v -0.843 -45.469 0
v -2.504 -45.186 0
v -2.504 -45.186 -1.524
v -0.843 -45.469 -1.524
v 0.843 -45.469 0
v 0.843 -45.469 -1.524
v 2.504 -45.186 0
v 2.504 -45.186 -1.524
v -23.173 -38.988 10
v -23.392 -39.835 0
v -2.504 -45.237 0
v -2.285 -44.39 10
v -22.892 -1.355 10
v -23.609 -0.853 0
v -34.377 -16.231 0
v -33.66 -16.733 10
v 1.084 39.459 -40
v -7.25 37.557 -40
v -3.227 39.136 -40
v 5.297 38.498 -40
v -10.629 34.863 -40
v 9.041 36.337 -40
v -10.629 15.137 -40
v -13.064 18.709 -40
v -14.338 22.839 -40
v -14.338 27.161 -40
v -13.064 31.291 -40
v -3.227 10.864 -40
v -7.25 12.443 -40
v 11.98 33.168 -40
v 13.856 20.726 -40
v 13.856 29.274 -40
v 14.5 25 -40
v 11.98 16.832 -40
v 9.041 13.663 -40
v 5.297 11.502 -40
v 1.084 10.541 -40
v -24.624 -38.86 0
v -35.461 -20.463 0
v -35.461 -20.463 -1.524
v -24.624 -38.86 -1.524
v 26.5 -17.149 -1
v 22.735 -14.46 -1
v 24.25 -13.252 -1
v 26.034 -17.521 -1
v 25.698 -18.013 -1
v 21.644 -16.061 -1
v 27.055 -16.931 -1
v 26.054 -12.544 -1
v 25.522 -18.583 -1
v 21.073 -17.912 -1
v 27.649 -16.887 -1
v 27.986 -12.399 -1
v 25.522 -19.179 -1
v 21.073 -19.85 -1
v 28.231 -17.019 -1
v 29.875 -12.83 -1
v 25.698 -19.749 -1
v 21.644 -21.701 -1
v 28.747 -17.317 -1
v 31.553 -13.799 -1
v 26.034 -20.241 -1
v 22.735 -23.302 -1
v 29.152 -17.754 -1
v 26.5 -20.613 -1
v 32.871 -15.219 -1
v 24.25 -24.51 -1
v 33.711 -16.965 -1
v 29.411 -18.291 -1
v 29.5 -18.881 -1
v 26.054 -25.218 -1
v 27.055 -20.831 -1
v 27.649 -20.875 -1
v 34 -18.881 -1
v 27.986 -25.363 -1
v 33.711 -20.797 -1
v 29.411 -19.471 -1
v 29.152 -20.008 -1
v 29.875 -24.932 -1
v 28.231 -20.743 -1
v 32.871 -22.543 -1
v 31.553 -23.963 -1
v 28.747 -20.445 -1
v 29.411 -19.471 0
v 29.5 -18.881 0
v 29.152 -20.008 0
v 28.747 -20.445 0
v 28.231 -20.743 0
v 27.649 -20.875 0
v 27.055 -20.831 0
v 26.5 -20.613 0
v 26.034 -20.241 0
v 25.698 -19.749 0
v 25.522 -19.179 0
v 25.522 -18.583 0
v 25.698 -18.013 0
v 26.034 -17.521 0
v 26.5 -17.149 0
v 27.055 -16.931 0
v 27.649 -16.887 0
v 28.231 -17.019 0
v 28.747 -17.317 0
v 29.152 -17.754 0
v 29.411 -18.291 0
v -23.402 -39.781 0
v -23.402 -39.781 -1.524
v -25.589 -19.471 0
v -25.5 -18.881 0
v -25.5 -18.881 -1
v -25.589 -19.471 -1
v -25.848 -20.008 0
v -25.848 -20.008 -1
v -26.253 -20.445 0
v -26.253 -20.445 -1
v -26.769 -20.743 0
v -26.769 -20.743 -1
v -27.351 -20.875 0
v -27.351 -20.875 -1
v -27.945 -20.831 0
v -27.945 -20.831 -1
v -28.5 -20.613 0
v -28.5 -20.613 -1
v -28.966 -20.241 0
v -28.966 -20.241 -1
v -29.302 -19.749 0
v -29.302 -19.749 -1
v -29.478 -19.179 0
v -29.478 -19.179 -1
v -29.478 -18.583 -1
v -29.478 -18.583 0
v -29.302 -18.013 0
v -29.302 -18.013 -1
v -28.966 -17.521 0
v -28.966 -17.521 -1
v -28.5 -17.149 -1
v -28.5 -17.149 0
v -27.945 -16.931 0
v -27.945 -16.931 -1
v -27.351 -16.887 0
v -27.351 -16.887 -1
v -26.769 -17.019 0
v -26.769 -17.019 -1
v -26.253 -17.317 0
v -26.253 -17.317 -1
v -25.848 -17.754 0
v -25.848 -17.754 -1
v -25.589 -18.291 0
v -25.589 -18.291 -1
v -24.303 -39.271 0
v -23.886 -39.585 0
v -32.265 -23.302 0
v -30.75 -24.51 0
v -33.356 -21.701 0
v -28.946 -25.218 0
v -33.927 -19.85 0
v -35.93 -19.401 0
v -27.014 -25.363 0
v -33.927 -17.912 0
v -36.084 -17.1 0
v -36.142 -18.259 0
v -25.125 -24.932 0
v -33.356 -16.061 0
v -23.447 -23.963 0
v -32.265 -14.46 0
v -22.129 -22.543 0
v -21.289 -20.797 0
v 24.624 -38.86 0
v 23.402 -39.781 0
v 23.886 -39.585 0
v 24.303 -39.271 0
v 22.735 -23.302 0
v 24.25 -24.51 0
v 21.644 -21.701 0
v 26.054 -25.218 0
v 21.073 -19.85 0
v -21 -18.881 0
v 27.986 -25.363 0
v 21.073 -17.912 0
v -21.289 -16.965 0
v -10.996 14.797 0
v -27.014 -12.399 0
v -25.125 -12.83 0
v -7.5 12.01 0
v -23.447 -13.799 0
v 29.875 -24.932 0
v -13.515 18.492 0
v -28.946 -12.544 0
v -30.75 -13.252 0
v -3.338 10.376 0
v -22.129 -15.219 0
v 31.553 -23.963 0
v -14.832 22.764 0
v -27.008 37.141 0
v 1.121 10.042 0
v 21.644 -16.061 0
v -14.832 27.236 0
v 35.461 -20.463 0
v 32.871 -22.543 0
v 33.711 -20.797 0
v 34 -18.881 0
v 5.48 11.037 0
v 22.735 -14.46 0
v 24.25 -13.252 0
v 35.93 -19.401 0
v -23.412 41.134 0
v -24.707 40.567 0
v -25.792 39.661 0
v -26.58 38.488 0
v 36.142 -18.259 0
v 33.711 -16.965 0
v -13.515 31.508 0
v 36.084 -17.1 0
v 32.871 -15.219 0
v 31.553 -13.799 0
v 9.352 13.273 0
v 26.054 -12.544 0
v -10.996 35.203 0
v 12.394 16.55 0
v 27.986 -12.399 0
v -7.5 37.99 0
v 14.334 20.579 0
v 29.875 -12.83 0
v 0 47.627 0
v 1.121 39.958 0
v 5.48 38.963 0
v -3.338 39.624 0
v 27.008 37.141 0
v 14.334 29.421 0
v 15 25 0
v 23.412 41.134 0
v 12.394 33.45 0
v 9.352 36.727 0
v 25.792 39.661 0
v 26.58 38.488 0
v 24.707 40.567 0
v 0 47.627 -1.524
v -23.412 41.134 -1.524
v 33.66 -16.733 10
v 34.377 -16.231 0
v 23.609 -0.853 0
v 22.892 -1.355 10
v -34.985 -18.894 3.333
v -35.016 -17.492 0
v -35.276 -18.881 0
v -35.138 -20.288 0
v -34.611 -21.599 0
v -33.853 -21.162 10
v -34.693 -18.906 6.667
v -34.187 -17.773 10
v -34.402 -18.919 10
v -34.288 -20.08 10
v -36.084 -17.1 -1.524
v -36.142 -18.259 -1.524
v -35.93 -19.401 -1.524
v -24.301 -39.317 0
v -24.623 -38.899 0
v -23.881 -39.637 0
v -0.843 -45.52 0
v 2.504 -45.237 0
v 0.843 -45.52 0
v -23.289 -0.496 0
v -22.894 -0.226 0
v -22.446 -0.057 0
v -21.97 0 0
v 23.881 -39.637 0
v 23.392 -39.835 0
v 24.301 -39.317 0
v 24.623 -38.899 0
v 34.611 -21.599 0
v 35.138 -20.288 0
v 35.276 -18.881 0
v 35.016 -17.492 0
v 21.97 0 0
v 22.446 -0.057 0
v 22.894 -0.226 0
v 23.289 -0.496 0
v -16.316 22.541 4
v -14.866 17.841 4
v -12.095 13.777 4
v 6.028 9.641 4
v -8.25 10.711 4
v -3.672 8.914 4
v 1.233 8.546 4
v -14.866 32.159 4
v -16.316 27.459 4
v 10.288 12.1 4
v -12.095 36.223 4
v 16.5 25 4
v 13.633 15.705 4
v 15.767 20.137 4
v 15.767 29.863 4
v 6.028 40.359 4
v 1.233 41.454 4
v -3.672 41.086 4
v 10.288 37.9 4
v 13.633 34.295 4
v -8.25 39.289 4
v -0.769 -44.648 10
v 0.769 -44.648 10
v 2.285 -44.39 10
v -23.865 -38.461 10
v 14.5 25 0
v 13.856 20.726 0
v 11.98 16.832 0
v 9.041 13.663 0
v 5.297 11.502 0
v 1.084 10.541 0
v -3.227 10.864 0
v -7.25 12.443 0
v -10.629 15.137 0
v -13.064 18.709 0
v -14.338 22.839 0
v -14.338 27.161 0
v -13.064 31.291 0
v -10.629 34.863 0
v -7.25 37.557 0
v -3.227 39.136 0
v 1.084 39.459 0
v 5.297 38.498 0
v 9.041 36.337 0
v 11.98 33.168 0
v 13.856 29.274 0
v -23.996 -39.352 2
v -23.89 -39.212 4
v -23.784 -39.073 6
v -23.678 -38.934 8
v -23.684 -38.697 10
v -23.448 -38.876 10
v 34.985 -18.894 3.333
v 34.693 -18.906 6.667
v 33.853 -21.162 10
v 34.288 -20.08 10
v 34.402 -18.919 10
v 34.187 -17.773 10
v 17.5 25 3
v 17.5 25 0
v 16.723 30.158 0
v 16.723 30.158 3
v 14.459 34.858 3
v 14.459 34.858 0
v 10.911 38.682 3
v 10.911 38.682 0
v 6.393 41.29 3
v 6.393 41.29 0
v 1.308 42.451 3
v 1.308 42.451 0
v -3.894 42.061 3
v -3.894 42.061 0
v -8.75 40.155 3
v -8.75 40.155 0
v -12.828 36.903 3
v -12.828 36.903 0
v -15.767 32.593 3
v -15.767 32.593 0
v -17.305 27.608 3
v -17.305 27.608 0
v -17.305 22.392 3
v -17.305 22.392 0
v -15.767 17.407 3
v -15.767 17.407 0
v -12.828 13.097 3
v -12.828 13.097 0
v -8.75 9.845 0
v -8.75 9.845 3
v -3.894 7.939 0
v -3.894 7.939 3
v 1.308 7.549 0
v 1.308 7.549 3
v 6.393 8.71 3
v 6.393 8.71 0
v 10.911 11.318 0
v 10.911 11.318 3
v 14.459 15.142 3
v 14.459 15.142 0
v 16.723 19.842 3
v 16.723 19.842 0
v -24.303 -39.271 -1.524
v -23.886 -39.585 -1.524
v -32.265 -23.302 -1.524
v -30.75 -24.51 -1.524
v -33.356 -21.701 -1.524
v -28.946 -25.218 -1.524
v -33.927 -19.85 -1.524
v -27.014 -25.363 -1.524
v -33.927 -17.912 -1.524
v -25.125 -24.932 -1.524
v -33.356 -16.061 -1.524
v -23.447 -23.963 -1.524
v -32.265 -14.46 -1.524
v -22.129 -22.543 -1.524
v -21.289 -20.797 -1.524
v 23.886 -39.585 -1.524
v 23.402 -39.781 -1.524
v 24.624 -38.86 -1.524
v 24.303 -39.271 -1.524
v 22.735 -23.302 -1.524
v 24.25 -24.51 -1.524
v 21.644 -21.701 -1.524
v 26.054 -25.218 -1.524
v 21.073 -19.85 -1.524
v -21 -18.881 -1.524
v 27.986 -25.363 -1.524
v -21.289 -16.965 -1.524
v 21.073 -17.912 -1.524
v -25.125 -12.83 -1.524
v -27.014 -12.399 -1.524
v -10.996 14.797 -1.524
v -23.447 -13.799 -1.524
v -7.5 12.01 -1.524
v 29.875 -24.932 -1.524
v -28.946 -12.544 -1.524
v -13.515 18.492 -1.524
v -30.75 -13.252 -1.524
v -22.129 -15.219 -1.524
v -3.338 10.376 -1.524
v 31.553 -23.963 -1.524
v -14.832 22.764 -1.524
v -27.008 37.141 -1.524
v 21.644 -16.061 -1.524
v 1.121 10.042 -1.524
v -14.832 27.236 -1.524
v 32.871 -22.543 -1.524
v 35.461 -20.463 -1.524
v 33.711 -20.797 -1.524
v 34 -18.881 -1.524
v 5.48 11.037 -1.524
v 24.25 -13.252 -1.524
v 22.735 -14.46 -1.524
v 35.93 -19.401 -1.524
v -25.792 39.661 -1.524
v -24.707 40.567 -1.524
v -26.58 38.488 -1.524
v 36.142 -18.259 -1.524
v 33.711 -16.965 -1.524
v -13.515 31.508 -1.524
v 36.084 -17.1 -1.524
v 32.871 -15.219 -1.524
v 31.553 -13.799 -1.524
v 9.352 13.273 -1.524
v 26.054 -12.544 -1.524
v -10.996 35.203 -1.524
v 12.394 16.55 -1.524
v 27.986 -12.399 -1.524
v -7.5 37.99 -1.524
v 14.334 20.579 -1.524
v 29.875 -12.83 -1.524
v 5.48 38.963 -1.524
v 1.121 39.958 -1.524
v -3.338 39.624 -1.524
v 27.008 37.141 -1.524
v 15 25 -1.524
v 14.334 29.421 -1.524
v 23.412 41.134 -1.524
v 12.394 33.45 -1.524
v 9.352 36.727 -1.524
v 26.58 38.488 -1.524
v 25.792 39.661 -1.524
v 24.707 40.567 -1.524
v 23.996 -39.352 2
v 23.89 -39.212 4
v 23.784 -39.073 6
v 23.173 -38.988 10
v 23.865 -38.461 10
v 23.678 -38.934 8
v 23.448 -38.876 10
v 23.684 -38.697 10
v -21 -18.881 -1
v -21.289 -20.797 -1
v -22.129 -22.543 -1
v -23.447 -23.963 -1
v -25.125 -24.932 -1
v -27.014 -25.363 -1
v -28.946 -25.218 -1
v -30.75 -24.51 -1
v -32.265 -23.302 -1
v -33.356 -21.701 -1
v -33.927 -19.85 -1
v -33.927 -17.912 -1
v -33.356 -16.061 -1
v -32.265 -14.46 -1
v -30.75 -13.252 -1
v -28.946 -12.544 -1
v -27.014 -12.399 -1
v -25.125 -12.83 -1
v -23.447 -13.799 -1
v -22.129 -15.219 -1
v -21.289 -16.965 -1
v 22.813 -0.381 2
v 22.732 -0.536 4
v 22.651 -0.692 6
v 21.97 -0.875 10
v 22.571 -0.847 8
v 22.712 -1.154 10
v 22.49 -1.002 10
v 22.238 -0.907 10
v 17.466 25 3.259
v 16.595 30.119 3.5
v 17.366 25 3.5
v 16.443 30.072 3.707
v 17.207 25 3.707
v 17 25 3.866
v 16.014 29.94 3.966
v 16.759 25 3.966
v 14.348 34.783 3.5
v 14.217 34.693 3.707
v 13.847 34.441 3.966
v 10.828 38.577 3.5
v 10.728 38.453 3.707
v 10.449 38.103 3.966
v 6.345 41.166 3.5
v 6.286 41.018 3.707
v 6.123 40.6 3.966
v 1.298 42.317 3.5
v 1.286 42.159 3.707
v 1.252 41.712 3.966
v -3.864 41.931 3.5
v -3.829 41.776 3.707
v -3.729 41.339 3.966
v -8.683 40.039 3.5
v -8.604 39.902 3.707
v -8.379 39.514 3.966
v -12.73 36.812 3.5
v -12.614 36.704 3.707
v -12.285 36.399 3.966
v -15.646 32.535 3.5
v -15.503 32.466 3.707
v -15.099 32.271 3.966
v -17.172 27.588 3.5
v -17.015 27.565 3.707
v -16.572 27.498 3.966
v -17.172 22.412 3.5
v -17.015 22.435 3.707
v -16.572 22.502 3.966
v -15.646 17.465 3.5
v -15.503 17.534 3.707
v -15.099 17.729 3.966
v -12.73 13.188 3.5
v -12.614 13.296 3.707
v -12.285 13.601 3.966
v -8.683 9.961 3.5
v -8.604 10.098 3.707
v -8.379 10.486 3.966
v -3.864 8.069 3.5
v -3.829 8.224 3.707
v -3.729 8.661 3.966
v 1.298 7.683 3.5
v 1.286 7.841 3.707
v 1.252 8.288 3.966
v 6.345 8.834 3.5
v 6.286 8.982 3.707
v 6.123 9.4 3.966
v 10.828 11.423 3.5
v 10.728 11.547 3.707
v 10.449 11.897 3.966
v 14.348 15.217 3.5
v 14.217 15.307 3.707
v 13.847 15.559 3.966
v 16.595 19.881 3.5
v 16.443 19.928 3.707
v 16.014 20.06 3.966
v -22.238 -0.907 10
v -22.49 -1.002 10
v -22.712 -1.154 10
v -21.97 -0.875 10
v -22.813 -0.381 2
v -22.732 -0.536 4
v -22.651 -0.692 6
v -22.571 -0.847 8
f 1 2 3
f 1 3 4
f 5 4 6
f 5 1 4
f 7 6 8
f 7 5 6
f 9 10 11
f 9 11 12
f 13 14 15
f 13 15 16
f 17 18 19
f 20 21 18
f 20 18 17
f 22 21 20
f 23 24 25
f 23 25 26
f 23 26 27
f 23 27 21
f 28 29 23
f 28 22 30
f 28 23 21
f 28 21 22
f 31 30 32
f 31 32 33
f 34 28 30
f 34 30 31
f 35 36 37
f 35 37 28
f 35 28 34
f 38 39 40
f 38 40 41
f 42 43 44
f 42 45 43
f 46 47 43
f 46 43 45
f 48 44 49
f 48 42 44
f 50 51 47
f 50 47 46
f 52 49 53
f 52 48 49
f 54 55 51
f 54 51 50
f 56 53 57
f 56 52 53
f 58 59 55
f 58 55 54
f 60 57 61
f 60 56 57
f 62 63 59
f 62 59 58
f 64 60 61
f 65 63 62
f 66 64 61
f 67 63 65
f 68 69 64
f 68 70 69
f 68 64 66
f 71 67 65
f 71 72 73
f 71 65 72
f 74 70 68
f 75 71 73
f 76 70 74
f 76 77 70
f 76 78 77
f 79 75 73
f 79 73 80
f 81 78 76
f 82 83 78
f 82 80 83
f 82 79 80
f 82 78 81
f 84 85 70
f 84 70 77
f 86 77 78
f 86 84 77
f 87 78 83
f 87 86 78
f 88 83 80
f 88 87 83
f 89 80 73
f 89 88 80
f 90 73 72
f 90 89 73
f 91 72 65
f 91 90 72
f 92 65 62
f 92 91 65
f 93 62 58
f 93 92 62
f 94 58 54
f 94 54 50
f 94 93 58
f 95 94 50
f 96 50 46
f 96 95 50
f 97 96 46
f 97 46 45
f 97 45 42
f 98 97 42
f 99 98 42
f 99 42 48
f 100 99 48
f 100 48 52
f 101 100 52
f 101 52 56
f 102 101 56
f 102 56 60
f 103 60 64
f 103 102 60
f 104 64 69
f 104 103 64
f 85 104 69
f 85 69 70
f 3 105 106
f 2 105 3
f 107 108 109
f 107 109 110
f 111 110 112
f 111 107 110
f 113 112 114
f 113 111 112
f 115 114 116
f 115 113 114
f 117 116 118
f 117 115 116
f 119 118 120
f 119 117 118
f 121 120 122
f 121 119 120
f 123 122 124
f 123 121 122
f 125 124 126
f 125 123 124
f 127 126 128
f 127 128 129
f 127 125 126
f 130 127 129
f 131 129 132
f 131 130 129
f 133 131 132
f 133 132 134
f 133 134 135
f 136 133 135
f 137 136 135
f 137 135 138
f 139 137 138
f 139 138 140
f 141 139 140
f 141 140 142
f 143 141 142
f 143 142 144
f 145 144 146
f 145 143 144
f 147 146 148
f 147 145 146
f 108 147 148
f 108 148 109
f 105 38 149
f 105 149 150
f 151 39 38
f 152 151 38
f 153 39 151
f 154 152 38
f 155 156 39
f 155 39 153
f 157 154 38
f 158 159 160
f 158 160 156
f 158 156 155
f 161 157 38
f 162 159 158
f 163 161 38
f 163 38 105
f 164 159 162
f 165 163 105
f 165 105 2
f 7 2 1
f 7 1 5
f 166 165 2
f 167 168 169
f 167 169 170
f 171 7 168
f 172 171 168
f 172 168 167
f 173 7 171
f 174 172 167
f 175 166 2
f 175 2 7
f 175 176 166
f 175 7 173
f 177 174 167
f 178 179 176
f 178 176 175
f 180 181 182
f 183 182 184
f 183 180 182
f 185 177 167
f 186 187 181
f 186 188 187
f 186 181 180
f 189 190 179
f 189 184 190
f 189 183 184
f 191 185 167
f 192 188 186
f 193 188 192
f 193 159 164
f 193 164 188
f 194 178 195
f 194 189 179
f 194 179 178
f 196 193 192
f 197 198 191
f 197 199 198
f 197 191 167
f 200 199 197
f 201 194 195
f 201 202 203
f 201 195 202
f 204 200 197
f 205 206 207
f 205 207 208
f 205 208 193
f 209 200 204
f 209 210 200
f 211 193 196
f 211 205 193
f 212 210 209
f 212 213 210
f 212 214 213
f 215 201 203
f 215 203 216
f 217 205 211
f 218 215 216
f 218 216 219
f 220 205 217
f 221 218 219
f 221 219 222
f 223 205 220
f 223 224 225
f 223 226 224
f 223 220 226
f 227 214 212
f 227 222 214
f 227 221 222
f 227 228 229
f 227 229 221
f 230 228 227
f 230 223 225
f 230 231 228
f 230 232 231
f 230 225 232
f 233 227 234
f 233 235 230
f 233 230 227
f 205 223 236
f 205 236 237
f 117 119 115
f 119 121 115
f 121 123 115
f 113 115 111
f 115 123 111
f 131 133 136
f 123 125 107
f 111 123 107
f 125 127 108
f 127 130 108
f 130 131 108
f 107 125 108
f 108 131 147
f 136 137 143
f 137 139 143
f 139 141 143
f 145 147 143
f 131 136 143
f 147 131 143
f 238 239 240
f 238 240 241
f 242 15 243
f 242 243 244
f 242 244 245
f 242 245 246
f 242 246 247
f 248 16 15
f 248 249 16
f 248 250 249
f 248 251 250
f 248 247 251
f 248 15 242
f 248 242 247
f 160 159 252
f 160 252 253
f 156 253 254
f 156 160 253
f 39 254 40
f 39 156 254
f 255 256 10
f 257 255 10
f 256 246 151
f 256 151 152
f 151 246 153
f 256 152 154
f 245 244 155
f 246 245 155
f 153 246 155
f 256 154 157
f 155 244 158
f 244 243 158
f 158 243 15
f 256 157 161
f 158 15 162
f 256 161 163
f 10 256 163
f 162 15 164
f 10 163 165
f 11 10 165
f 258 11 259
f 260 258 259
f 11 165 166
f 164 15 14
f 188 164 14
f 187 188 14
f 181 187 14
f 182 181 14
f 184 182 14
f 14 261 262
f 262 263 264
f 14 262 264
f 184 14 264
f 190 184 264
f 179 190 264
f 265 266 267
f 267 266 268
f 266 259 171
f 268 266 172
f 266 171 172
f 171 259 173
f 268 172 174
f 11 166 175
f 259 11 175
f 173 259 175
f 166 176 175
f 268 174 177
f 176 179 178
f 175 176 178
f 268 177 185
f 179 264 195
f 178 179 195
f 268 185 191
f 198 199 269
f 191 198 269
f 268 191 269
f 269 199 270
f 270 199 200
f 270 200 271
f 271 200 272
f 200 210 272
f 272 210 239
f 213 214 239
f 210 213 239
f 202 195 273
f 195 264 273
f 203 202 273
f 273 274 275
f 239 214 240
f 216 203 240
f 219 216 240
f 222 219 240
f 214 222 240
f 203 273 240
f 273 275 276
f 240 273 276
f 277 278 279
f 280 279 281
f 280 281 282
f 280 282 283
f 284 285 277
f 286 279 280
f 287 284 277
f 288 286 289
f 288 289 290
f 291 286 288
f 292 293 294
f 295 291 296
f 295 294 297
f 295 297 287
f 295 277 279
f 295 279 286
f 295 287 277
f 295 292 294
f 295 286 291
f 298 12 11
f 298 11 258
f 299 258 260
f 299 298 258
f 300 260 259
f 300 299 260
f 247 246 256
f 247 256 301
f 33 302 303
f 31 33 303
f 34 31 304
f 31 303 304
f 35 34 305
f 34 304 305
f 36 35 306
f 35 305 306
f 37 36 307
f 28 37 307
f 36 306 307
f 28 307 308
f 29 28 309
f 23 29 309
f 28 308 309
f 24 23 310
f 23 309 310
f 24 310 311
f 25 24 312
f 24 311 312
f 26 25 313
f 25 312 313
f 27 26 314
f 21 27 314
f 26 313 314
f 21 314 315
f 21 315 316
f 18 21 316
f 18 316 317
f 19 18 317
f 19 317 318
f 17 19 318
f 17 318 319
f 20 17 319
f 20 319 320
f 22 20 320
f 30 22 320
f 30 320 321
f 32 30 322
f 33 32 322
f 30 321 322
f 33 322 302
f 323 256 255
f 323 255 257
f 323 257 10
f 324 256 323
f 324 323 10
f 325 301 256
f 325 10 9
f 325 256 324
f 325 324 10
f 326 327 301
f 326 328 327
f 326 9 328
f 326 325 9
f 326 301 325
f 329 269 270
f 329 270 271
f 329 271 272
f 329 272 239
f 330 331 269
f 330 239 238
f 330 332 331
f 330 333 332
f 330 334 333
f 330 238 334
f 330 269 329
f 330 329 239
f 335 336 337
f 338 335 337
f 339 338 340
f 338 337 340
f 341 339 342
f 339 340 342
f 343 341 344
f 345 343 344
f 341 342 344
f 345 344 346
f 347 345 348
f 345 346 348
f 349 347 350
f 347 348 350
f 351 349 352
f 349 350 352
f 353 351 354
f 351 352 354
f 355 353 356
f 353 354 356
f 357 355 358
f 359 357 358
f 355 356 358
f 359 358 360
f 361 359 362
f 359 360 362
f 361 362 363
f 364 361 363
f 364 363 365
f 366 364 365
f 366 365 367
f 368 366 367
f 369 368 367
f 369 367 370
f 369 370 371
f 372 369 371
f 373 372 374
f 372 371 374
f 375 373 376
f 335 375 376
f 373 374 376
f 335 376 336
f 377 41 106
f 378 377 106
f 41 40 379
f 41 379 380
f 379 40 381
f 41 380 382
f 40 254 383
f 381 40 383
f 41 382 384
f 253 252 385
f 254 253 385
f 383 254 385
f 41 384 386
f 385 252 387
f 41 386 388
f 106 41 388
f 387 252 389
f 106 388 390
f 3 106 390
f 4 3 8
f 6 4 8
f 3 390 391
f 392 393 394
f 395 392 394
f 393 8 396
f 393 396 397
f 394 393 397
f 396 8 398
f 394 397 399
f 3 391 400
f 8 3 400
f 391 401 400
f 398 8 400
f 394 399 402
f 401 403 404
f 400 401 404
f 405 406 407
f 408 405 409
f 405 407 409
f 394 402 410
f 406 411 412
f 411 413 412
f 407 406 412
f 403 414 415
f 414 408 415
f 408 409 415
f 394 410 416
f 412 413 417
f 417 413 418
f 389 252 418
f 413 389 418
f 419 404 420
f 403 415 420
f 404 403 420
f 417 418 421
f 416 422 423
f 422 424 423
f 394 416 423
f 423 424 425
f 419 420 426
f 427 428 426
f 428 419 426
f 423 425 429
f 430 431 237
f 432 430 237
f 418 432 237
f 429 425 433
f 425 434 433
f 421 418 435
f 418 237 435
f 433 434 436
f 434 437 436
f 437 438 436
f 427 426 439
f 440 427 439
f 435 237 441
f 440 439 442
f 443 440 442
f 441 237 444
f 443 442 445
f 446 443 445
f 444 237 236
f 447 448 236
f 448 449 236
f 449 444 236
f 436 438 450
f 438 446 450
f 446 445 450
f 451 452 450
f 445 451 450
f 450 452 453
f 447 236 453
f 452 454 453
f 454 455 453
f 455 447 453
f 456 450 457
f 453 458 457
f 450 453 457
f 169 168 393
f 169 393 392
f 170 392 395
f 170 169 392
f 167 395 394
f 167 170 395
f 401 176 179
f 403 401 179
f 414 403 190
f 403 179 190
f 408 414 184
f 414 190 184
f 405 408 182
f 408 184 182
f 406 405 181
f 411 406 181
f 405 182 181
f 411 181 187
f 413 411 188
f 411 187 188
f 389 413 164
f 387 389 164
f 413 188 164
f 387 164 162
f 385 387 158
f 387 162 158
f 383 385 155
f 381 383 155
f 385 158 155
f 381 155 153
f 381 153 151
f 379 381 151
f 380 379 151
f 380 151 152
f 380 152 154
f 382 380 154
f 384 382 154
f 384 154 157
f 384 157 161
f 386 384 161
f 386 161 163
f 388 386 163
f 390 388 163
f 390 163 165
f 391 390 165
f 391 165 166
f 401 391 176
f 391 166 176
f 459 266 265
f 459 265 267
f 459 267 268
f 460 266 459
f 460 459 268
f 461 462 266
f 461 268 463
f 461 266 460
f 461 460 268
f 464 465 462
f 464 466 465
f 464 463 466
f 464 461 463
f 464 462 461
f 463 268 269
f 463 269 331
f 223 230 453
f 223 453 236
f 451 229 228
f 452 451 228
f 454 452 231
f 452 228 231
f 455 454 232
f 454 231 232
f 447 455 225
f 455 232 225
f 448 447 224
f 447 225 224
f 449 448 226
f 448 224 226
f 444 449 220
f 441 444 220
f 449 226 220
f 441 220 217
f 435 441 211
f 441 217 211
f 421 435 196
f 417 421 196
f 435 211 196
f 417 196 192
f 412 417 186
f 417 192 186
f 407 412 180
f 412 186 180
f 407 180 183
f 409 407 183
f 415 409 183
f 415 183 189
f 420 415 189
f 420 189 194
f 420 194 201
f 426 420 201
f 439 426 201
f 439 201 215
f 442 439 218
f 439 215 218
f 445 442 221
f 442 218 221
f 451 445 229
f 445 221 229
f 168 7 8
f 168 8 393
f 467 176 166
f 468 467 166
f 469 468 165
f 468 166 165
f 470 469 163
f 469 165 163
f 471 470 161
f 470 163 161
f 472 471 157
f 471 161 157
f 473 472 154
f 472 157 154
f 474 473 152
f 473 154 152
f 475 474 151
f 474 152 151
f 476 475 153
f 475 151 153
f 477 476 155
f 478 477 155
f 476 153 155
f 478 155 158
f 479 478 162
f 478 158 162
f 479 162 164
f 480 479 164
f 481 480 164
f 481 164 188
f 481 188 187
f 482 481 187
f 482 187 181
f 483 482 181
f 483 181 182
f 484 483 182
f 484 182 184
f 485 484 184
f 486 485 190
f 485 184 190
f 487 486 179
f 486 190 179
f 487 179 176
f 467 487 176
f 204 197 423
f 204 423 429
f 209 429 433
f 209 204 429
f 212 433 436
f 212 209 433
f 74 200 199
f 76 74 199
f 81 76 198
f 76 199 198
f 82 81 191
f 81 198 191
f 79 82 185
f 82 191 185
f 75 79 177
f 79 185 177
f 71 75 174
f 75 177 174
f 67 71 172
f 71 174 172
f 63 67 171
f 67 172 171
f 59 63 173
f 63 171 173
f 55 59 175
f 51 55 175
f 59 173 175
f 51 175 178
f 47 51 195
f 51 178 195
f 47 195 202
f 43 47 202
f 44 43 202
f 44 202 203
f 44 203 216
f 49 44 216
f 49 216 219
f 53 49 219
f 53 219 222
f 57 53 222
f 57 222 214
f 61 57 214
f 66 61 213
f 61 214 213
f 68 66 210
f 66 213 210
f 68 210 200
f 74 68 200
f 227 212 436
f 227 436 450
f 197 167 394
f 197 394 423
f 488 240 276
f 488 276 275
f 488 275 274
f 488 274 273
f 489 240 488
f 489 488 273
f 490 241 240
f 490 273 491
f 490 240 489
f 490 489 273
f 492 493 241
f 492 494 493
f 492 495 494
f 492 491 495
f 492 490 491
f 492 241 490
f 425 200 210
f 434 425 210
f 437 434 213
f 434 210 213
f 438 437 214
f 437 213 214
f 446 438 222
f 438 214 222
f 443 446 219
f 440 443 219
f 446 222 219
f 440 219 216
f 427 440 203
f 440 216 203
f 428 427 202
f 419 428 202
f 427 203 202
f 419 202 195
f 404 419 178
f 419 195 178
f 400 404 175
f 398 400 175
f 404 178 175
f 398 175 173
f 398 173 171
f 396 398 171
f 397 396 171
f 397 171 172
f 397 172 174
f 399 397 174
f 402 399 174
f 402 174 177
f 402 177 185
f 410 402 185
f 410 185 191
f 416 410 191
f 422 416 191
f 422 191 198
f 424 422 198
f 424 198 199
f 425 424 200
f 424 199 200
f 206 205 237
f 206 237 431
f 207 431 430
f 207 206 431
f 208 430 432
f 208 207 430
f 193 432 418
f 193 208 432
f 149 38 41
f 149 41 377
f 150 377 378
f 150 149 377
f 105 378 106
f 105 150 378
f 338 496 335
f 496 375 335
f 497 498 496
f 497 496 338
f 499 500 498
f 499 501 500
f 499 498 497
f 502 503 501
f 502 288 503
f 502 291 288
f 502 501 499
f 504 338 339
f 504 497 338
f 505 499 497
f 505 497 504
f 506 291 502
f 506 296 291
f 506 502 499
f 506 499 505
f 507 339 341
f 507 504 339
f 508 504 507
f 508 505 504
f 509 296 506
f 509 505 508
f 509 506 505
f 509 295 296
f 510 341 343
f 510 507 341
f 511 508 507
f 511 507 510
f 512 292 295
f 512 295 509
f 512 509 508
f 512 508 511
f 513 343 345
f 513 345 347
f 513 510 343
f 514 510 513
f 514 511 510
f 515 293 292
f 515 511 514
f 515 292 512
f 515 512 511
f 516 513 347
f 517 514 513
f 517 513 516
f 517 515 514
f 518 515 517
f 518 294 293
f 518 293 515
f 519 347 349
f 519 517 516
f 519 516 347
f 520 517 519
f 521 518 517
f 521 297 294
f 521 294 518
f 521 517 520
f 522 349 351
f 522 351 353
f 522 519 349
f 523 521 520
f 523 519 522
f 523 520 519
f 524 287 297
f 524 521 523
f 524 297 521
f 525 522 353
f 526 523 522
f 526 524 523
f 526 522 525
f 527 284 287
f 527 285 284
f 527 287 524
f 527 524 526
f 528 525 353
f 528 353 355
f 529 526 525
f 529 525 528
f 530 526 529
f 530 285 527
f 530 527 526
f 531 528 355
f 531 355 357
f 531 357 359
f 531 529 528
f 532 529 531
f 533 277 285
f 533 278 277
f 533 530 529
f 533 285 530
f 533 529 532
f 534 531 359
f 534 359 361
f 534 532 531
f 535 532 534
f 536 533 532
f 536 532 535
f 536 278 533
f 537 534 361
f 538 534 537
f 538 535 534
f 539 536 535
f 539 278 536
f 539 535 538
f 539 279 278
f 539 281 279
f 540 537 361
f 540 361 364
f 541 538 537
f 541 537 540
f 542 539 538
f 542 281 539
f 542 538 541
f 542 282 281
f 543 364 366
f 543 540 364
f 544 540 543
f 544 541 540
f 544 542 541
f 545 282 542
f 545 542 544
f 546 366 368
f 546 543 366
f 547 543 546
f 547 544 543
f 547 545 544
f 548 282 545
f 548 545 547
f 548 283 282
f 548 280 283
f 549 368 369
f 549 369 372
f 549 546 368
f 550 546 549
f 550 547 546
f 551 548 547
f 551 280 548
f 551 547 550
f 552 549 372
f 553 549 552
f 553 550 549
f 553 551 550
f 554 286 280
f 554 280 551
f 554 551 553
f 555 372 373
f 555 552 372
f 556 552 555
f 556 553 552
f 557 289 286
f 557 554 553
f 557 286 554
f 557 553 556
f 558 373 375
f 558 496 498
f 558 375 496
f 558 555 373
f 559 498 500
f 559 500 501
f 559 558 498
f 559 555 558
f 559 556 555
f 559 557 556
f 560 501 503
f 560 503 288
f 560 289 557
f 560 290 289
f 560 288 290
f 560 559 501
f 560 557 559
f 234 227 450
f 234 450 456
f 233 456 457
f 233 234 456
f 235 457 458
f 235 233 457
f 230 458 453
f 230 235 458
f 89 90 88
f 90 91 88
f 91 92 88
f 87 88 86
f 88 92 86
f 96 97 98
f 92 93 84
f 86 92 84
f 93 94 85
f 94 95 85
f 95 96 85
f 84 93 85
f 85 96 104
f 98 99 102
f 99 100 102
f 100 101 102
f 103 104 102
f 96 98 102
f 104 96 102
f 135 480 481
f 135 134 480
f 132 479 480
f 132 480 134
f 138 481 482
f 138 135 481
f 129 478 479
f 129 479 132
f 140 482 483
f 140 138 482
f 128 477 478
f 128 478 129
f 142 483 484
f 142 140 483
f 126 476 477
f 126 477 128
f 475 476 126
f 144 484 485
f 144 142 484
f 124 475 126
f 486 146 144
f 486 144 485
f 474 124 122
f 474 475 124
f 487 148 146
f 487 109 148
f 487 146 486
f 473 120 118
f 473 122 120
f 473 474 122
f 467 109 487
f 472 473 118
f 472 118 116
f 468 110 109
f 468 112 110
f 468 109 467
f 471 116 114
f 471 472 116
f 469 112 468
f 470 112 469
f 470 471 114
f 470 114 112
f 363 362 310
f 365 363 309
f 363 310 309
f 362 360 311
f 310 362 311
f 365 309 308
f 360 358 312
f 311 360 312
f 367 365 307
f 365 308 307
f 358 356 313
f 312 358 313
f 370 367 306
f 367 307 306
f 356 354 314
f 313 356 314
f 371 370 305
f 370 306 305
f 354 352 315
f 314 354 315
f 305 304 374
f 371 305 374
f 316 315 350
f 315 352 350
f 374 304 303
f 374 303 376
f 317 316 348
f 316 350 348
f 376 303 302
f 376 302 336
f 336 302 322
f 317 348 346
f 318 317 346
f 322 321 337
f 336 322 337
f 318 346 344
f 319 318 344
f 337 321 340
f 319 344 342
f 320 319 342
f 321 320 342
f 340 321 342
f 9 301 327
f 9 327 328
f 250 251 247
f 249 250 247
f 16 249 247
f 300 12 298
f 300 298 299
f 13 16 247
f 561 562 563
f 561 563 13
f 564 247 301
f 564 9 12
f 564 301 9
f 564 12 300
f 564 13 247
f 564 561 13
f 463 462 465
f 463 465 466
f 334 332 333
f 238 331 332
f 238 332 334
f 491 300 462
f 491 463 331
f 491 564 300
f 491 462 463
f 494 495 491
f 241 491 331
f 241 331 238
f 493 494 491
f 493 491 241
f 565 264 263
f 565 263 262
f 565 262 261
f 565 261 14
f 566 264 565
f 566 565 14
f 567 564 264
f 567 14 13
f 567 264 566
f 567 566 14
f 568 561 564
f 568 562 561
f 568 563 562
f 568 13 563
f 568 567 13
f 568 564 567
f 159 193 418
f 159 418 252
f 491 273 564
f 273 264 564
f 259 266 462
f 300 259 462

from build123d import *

# Parameters (mm, degrees)
F1_DEPTH  = 10
F1_TAPER  = 5
F2_R      = 6.5
F2_R_2    = 2
F3_DEPTH  = 1
F4_R      = 17.5
F5_DEPTH  = 4
F6_R      = 1
F7_R      = 14.5
F8_DEPTH  = 40
F9_R      = 6.5
F9_R_2    = 15
F10_DEPTH = 1.524


with BuildPart() as f1:
    # F0 (on Top) → F1 (new body)
    with BuildSketch(Plane.XY):
        with BuildLine():
            Line((21.9702988723, 0), (0, 0))
            Line((0, 0), (-21.9702988723, 0))
            ThreePointArc((-21.9702988723, 0), (-22.8937960987, -0.2259783336), (-23.6086029609, -0.8528471273))
            Line((-23.6086029609, -0.8528471273), (-34.37664856, -16.2312099862))
            ThreePointArc((-34.37664856, -16.2312099862), (-35.2761294464, -18.8809952311), (-34.6110153574, -21.5990921679))
            Line((-34.6110153574, -21.5990921679), (-24.6230258112, -38.8987975274))
            ThreePointArc((-24.6230258112, -38.8987975274), (-24.1015629797, -39.4908015325), (-23.3917350118, -39.8350928082))
            Line((-23.3917350118, -39.8350928082), (-2.5038000405, -45.2370800926))
            ThreePointArc((-2.5038000405, -45.2370800926), (0, -45.5556036889), (2.5038000405, -45.2370800926))
            Line((2.5038000405, -45.2370800926), (23.3917350118, -39.8350928082))
            ThreePointArc((23.3917350118, -39.8350928082), (24.1015629797, -39.4908015325), (24.6230258112, -38.8987975274))
            Line((24.6230258112, -38.8987975274), (34.6110153574, -21.5990921679))
            ThreePointArc((34.6110153574, -21.5990921679), (35.2761294464, -18.8809952311), (34.37664856, -16.2312099862))
            Line((34.37664856, -16.2312099862), (23.6086029609, -0.8528471273))
            ThreePointArc((23.6086029609, -0.8528471273), (22.8937960987, -0.2259783336), (21.9702988723, 0))
        make_face()
    extrude(amount=F1_DEPTH, taper=F1_TAPER)

    # F2 (on face) → F3 (join)
    with BuildSketch(Plane(origin=(0, 0, 0), x_dir=(1, 0, 0), z_dir=(0, 0, -1))):
        with Locations((-27.5, 18.8809952311)):
            Circle(F2_R)
        with Locations((-27.5, 18.8809952311)):
            Circle(F2_R_2, mode=Mode.SUBTRACT)
        with Locations((27.5, 18.8809952311)):
            Circle(F2_R)
        with Locations((27.5, 18.8809952311)):
            Circle(F2_R_2, mode=Mode.SUBTRACT)
    extrude(amount=F3_DEPTH)


with BuildPart() as f5:
    # F4 (on Top) → F5 (new body)
    with BuildSketch(Plane.XY):
        with Locations((0, 25)):
            Circle(F4_R)
    extrude(amount=F5_DEPTH)

    # F6
    f6_edges = [f5.edges().sort_by_distance(p)[0] for p in [
        (-17.5, 25, 4),
    ]]
    fillet(f6_edges, radius=F6_R)

    # F7 (on face) → F8 (join)
    with BuildSketch(Plane(origin=(0, 0, 0), x_dir=(1, 0, 0), z_dir=(0, 0, -1))):
        with Locations((0, -25)):
            Circle(F7_R)
    extrude(amount=F8_DEPTH)


with BuildPart() as f10:
    # F9 (on Top) → F10 (new body)
    with BuildSketch(Plane.XY):
        with BuildLine():
            ThreePointArc((-36.0842868047, -17.0996168992), (-36.069131089, -18.8360325364), (-35.4610002497, -20.4625459372))
            Line((-35.4610002497, -20.4625459372), (-24.6241585752, -38.8597979669))
            ThreePointArc((-24.6241585752, -38.8597979669), (-24.1045295476, -39.441991589), (-23.401659071, -39.7810149406))
            Line((-23.401659071, -39.7810149406), (-2.5037875188, -45.1855431631))
            ThreePointArc((-2.5037875188, -45.1855431631), (0, -45.504063521), (2.5037875188, -45.1855431631))
            Line((2.5037875188, -45.1855431631), (23.401659071, -39.7810149406))
            ThreePointArc((23.401659071, -39.7810149406), (24.1045295476, -39.441991589), (24.6241585752, -38.8597979669))
            Line((24.6241585752, -38.8597979669), (35.4610002497, -20.4625459372))
            ThreePointArc((35.4610002497, -20.4625459372), (36.069131089, -18.8360325364), (36.0842868047, -17.0996168992))
            Line((36.0842868047, -17.0996168992), (27.0075972916, 37.1409717984))
            ThreePointArc((27.0075972916, 37.1409717984), (25.7918966711, 39.6613883732), (23.4123663286, 41.1338906851))
            Line((23.4123663286, 41.1338906851), (0, 47.6267471122))
            Line((0, 47.6267471122), (-23.4123663286, 41.1338906851))
            ThreePointArc((-23.4123663286, 41.1338906851), (-25.7918966711, 39.6613883732), (-27.0075972916, 37.1409717984))
            Line((-27.0075972916, 37.1409717984), (-36.0842868047, -17.0996168992))
        make_face()
        with Locations((-27.5, -18.8809952311)):
            Circle(F9_R, mode=Mode.SUBTRACT)
        with Locations((27.5, -18.8809952311)):
            Circle(F9_R, mode=Mode.SUBTRACT)
        with Locations((0, 25)):
            Circle(F9_R_2, mode=Mode.SUBTRACT)
    extrude(amount=-F10_DEPTH)


solid = Compound([f1.part, f5.part, f10.part])
